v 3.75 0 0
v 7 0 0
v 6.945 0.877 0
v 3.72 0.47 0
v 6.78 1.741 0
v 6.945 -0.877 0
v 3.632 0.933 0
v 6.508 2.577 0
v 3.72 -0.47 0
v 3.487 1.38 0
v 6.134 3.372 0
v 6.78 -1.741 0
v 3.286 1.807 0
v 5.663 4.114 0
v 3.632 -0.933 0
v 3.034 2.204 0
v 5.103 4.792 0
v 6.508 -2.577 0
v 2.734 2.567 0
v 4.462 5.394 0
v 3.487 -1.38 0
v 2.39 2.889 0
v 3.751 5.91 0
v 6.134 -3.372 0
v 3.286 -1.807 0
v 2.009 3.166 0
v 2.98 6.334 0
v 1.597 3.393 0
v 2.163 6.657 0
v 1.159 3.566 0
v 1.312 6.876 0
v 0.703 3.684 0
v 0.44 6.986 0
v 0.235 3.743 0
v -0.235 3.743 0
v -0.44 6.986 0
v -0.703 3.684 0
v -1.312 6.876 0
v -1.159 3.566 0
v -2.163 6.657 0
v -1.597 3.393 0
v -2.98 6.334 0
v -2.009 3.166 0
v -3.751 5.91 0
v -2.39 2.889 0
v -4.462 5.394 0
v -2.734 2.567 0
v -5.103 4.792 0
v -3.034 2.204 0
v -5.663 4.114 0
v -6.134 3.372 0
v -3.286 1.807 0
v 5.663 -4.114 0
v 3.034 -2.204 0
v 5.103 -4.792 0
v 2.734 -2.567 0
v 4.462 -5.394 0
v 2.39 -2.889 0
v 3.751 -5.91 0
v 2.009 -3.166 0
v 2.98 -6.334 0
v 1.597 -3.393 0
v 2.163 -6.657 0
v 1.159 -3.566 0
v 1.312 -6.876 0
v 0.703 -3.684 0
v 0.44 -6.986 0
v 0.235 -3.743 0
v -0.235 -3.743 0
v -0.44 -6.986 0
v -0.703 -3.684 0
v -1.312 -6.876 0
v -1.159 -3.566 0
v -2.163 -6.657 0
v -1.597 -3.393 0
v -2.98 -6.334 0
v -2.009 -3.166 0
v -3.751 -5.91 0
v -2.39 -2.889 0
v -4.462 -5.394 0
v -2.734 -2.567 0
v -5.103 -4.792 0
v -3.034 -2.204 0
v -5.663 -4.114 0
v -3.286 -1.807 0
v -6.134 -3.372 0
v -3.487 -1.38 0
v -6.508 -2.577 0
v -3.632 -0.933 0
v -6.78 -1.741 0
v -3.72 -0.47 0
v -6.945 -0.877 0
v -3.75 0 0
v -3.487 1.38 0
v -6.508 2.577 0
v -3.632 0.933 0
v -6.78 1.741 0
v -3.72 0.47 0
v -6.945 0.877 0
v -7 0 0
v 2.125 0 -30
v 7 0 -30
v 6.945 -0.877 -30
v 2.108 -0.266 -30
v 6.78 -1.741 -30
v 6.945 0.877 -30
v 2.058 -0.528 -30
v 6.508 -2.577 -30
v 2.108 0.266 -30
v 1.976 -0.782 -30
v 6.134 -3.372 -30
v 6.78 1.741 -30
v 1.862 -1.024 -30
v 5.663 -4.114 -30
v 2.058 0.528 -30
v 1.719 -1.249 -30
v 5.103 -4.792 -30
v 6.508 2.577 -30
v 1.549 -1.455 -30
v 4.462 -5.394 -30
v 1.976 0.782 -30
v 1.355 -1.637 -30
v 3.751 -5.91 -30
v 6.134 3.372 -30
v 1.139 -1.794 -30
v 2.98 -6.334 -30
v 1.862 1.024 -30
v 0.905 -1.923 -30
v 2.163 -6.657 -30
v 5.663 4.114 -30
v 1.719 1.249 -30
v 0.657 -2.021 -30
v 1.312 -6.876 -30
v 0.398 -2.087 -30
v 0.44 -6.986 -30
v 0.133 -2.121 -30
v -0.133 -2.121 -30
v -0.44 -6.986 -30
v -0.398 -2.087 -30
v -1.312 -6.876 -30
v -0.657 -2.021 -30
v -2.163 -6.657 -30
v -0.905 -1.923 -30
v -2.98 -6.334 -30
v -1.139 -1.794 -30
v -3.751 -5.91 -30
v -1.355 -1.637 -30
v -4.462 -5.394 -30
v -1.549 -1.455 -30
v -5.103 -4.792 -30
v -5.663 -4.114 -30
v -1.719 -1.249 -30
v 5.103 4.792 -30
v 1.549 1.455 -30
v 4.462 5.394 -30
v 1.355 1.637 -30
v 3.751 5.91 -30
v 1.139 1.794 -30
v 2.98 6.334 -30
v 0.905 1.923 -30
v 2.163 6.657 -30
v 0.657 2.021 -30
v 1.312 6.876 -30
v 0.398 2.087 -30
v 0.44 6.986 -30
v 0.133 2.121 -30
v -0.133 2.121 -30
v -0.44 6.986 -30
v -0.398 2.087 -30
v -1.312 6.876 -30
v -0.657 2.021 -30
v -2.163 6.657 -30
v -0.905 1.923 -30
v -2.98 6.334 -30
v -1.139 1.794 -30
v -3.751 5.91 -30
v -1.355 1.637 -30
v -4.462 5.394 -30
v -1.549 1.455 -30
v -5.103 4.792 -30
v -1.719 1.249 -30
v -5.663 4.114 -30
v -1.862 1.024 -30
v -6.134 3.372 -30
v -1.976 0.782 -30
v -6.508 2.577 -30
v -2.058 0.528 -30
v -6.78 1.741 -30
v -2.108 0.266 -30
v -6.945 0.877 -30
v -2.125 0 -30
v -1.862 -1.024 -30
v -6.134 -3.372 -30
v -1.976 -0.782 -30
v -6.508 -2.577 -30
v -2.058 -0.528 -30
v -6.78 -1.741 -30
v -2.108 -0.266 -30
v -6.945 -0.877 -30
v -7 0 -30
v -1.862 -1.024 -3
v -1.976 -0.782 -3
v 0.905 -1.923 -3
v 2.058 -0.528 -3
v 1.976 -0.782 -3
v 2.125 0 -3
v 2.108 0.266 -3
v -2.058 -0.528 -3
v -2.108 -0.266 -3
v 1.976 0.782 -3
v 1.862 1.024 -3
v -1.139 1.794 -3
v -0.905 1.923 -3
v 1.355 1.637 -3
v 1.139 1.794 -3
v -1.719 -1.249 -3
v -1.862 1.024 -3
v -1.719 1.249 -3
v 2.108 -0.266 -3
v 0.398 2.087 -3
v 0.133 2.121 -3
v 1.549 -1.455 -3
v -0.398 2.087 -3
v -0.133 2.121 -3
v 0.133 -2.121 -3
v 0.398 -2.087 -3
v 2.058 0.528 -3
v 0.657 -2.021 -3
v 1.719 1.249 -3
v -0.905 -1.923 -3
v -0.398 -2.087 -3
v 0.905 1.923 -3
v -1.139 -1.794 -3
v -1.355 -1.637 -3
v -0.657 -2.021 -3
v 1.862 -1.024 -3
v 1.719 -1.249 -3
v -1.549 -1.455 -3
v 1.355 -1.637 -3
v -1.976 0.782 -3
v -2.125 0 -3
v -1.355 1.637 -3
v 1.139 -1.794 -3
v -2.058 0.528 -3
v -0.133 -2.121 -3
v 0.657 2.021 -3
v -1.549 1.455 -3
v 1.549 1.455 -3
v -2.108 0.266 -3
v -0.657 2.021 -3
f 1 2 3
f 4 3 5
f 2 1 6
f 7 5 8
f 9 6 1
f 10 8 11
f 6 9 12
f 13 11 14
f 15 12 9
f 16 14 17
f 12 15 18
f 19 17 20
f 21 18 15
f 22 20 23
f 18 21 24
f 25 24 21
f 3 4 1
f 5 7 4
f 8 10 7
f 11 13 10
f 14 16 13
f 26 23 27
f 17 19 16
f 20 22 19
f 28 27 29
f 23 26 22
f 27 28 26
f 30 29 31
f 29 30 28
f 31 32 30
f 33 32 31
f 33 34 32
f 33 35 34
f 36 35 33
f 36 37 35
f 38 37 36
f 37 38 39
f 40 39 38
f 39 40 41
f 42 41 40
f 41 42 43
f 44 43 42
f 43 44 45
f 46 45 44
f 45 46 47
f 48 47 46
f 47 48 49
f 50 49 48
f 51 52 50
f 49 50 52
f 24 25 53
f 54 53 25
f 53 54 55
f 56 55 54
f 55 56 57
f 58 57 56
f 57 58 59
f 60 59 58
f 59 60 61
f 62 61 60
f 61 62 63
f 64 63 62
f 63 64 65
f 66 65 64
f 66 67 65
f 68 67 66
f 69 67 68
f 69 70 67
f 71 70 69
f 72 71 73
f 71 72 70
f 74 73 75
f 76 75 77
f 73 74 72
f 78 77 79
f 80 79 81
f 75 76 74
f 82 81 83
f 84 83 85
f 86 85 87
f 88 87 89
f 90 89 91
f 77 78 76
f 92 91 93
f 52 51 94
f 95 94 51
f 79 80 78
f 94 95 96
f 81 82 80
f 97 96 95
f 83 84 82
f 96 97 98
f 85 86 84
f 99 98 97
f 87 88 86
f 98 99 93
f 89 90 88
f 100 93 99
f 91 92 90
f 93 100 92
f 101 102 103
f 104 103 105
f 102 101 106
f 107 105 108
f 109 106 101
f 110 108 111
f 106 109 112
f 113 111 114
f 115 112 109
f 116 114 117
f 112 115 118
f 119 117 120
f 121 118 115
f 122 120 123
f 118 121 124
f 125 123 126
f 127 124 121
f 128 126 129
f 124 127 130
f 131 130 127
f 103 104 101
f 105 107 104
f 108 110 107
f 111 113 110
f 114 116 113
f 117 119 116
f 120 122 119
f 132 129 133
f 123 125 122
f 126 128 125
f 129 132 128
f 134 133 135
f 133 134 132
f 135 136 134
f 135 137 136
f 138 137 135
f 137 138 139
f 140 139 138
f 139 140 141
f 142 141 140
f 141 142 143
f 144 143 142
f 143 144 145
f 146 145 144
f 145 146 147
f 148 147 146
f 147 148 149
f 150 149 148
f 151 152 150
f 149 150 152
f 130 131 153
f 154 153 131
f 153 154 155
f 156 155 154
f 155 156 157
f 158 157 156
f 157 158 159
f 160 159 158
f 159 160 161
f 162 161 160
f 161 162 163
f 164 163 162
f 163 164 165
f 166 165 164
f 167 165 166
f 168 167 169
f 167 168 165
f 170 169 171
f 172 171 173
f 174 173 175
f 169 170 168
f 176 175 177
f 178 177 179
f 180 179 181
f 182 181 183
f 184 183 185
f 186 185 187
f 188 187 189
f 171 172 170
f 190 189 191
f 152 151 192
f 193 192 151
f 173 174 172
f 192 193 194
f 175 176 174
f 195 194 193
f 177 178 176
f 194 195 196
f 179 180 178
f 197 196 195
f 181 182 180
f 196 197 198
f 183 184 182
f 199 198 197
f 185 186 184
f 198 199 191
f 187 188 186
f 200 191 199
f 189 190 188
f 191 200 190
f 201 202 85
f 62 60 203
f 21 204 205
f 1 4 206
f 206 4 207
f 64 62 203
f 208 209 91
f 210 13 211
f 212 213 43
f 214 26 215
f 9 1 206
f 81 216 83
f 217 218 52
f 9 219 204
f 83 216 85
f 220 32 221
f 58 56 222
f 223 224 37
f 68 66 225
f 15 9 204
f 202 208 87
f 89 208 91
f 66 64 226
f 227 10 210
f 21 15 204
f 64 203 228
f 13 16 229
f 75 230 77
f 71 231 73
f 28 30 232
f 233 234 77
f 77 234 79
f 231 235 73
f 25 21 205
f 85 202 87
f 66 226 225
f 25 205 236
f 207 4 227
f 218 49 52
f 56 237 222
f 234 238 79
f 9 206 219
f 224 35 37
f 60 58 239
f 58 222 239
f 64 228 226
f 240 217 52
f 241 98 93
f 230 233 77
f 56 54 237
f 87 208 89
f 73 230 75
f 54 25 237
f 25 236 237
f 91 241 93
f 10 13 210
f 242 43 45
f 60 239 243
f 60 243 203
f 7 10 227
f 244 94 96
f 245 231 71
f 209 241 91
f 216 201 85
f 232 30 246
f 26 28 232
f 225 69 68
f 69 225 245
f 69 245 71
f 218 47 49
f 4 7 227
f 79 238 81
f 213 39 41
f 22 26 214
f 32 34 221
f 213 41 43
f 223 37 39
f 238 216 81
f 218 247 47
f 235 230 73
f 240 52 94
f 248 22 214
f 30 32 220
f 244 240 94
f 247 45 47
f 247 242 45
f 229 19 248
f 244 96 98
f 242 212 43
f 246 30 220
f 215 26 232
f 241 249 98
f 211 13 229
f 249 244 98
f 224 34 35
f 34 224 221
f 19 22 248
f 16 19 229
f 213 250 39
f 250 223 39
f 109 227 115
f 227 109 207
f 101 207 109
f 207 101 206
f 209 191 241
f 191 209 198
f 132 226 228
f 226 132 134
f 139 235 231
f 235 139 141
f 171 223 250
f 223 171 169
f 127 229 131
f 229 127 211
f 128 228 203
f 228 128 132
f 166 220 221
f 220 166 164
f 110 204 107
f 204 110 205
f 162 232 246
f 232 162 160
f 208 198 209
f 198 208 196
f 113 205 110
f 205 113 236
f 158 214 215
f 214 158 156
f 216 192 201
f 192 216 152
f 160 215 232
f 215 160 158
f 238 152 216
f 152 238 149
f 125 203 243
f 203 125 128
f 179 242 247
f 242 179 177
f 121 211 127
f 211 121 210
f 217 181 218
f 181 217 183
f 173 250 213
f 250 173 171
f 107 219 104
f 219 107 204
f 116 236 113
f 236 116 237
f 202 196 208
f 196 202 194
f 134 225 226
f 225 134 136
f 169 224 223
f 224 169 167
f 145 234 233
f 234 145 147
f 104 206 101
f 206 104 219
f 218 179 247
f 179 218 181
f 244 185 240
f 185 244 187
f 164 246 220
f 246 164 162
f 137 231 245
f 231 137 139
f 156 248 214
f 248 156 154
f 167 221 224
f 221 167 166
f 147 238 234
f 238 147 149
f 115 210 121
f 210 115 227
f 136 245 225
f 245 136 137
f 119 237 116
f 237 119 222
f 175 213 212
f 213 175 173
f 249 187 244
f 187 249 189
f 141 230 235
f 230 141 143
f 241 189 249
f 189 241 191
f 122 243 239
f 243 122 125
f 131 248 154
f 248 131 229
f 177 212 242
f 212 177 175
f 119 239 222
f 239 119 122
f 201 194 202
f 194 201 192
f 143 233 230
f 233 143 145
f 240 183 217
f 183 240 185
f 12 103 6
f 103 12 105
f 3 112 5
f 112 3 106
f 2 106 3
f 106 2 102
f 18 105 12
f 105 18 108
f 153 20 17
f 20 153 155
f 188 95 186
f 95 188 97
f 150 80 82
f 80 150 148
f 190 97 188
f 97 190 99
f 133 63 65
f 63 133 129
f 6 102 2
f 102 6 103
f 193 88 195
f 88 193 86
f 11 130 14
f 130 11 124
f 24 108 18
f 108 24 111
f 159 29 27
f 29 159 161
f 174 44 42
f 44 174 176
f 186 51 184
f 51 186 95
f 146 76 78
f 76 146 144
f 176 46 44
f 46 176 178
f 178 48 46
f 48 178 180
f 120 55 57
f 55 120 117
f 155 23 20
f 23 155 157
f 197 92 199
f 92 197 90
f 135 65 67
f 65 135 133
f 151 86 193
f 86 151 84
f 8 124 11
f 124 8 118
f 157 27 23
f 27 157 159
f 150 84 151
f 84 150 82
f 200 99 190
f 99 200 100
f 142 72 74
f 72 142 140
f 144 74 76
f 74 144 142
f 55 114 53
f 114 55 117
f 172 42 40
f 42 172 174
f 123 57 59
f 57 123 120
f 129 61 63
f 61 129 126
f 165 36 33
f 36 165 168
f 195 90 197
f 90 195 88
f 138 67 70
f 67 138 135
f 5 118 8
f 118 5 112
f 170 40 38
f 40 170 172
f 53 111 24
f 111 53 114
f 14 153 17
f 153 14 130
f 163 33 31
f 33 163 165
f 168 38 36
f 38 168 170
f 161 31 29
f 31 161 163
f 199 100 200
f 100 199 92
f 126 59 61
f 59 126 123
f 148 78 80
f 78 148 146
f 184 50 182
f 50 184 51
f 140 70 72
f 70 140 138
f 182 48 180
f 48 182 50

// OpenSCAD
$fn = 50;


difference() {
	union() {
		translate(v = [0, 0, -30.0000000000]) {
			cylinder(h = 30, r = 7.0000000000);
		}
		cylinder(h = 0, r = 10.0000000000);
	}
	union() {
		translate(v = [0, 0, 0]) {
			rotate(a = [0, 0, 0]) {
				difference() {
					union() {
						#translate(v = [0, 0, -30.0000000000]) {
							cylinder(h = 30, r = 2.0000000000);
						}
						#translate(v = [0, 0, -3]) {
							cylinder(h = 3, r1 = 2.1250000000, r2 = 3.7500000000);
						}
						#translate(v = [0, 0, -30.0000000000]) {
							cylinder(h = 30, r = 2.1250000000);
						}
						#translate(v = [0, 0, -30.0000000000]) {
							cylinder(h = 30, r = 2.0000000000);
						}
					}
					union();
				}
			}
		}
	}
}
